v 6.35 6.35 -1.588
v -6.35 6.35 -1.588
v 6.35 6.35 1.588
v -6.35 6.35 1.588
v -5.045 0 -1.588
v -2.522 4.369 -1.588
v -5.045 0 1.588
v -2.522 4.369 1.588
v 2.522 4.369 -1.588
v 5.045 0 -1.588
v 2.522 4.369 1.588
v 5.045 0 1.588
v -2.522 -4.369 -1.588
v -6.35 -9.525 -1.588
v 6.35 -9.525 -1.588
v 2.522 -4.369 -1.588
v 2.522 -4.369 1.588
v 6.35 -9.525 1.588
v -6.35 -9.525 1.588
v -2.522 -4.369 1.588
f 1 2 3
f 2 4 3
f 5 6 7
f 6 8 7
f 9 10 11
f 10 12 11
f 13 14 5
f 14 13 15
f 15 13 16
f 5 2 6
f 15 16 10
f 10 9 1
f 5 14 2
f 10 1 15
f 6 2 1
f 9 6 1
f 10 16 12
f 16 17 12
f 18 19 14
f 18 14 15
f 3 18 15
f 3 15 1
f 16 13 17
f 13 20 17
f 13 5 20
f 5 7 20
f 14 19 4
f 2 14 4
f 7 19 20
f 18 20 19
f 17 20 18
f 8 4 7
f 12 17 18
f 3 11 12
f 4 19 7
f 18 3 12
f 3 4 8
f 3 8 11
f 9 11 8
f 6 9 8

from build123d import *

# Parameters (mm, degrees)
SKETCH1_W           = 12.7
SKETCH1_H           = 15.875
BOSS_EXTRUDE1_DEPTH = 1.5875


with BuildPart() as part:
    # Sketch1 → Boss-Extrude1 (new body, symmetric)
    with BuildSketch(Plane.XY):
        with Locations((0, -1.5875)):
            Rectangle(SKETCH1_W, SKETCH1_H)
        Polygon((2.522327856, 4.3688), (-2.522327856, 4.3688), (-5.044655712, 0), (-2.522327856, -4.3688), (2.522327856, -4.3688), (5.044655712, 0), align=None, mode=Mode.SUBTRACT)
    extrude(amount=BOSS_EXTRUDE1_DEPTH, both=True)


solid = part.part
